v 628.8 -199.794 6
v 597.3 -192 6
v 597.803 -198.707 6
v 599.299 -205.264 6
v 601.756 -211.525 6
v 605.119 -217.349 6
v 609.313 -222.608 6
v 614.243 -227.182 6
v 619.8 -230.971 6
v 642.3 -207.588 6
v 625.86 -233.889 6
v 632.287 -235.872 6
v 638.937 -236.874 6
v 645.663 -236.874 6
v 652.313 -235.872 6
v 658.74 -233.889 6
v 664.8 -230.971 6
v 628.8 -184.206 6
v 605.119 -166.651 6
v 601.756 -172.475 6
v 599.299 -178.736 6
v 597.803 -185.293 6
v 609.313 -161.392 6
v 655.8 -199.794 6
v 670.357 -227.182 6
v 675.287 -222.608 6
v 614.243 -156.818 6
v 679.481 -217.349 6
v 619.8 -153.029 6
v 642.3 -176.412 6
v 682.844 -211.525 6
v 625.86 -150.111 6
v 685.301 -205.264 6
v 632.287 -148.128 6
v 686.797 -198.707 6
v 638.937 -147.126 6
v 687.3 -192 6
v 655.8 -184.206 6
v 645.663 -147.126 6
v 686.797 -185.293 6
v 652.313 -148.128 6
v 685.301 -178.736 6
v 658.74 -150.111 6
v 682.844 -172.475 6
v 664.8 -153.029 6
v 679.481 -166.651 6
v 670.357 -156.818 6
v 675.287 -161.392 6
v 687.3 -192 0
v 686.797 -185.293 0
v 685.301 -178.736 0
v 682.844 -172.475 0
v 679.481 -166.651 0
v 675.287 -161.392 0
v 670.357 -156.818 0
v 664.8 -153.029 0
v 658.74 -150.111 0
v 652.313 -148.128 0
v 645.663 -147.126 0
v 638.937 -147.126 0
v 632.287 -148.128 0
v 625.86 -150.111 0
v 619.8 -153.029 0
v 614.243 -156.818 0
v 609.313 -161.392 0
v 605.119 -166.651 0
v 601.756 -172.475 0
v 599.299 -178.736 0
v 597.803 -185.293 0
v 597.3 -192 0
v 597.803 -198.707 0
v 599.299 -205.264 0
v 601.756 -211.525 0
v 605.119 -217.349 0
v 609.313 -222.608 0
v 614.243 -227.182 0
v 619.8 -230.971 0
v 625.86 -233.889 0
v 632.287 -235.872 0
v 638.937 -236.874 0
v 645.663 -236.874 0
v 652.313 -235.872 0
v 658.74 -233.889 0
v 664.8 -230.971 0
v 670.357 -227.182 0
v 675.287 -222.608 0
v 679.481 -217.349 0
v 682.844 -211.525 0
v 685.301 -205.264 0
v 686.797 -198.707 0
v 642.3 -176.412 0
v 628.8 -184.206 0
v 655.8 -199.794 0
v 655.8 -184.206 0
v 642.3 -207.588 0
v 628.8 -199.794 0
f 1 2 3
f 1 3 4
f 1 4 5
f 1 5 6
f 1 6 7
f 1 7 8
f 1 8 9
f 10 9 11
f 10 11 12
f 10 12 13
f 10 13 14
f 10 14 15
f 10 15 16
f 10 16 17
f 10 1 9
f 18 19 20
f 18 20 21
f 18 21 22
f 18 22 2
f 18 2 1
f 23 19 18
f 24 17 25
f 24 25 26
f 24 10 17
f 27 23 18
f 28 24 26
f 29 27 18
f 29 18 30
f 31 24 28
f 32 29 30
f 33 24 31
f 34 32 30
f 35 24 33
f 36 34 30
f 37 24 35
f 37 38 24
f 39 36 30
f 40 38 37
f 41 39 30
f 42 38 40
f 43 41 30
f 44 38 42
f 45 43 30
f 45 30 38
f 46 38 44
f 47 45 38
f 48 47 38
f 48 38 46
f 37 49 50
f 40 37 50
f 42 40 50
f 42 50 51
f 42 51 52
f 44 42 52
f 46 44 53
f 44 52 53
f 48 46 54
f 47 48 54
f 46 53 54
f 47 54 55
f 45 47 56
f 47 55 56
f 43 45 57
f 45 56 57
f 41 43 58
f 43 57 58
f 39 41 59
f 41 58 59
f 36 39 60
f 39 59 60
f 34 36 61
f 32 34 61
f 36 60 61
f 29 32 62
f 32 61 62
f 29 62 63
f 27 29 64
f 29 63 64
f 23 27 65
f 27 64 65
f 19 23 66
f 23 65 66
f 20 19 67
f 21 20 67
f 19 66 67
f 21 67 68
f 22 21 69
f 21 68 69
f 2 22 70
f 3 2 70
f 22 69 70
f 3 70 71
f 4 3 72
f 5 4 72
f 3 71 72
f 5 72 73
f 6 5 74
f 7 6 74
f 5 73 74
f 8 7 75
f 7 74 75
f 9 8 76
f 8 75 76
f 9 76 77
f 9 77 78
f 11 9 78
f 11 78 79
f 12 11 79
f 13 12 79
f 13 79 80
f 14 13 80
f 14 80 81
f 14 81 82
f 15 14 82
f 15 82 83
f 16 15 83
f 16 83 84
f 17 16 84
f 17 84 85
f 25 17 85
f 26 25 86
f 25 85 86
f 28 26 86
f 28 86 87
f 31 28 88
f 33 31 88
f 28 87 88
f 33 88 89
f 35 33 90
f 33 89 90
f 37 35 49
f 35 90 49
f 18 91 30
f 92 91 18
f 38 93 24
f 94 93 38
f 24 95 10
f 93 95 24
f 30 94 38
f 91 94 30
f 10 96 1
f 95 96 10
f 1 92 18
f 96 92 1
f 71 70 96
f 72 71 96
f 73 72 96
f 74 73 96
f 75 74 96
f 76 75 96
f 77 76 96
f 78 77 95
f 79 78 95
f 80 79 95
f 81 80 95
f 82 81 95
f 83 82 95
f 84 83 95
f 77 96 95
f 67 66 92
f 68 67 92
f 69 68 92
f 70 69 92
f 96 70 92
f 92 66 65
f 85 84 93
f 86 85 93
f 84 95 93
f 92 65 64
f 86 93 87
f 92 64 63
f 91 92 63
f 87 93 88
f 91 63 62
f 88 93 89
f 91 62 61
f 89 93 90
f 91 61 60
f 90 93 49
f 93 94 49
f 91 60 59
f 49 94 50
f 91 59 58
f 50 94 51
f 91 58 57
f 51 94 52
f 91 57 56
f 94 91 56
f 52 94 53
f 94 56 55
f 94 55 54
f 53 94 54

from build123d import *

# Parameters (mm, degrees)
MODEL_R             = 25
BOSS_EXTRUDE1_DEPTH = 6
BOSS_EXTRUDE2_START = -6
SKETCH2_R           = 45
SKETCH2_R_2         = 25
BOSS_EXTRUDE2_DEPTH = 6


with BuildPart() as part:
    # Model → Boss-Extrude1 (new body)
    with BuildSketch(Plane.XY):
        with Locations((642.3, -192)):
            Circle(MODEL_R)
        Polygon((628.8, -184.205771366), (628.8, -199.794228634), (642.3, -207.588457268), (655.8, -199.794228634), (655.8, -184.205771366), (642.3, -176.411542732), align=None, mode=Mode.SUBTRACT)
    extrude(amount=BOSS_EXTRUDE1_DEPTH)

    # Sketch2 → Boss-Extrude2 (add)
    with BuildSketch(Plane.XY.offset(6).offset(BOSS_EXTRUDE2_START)):
        with Locations((642.3, -192)):
            Circle(SKETCH2_R)
        with Locations((642.3, -192)):
            Circle(SKETCH2_R_2, mode=Mode.SUBTRACT)
    extrude(amount=BOSS_EXTRUDE2_DEPTH)


solid = part.part
